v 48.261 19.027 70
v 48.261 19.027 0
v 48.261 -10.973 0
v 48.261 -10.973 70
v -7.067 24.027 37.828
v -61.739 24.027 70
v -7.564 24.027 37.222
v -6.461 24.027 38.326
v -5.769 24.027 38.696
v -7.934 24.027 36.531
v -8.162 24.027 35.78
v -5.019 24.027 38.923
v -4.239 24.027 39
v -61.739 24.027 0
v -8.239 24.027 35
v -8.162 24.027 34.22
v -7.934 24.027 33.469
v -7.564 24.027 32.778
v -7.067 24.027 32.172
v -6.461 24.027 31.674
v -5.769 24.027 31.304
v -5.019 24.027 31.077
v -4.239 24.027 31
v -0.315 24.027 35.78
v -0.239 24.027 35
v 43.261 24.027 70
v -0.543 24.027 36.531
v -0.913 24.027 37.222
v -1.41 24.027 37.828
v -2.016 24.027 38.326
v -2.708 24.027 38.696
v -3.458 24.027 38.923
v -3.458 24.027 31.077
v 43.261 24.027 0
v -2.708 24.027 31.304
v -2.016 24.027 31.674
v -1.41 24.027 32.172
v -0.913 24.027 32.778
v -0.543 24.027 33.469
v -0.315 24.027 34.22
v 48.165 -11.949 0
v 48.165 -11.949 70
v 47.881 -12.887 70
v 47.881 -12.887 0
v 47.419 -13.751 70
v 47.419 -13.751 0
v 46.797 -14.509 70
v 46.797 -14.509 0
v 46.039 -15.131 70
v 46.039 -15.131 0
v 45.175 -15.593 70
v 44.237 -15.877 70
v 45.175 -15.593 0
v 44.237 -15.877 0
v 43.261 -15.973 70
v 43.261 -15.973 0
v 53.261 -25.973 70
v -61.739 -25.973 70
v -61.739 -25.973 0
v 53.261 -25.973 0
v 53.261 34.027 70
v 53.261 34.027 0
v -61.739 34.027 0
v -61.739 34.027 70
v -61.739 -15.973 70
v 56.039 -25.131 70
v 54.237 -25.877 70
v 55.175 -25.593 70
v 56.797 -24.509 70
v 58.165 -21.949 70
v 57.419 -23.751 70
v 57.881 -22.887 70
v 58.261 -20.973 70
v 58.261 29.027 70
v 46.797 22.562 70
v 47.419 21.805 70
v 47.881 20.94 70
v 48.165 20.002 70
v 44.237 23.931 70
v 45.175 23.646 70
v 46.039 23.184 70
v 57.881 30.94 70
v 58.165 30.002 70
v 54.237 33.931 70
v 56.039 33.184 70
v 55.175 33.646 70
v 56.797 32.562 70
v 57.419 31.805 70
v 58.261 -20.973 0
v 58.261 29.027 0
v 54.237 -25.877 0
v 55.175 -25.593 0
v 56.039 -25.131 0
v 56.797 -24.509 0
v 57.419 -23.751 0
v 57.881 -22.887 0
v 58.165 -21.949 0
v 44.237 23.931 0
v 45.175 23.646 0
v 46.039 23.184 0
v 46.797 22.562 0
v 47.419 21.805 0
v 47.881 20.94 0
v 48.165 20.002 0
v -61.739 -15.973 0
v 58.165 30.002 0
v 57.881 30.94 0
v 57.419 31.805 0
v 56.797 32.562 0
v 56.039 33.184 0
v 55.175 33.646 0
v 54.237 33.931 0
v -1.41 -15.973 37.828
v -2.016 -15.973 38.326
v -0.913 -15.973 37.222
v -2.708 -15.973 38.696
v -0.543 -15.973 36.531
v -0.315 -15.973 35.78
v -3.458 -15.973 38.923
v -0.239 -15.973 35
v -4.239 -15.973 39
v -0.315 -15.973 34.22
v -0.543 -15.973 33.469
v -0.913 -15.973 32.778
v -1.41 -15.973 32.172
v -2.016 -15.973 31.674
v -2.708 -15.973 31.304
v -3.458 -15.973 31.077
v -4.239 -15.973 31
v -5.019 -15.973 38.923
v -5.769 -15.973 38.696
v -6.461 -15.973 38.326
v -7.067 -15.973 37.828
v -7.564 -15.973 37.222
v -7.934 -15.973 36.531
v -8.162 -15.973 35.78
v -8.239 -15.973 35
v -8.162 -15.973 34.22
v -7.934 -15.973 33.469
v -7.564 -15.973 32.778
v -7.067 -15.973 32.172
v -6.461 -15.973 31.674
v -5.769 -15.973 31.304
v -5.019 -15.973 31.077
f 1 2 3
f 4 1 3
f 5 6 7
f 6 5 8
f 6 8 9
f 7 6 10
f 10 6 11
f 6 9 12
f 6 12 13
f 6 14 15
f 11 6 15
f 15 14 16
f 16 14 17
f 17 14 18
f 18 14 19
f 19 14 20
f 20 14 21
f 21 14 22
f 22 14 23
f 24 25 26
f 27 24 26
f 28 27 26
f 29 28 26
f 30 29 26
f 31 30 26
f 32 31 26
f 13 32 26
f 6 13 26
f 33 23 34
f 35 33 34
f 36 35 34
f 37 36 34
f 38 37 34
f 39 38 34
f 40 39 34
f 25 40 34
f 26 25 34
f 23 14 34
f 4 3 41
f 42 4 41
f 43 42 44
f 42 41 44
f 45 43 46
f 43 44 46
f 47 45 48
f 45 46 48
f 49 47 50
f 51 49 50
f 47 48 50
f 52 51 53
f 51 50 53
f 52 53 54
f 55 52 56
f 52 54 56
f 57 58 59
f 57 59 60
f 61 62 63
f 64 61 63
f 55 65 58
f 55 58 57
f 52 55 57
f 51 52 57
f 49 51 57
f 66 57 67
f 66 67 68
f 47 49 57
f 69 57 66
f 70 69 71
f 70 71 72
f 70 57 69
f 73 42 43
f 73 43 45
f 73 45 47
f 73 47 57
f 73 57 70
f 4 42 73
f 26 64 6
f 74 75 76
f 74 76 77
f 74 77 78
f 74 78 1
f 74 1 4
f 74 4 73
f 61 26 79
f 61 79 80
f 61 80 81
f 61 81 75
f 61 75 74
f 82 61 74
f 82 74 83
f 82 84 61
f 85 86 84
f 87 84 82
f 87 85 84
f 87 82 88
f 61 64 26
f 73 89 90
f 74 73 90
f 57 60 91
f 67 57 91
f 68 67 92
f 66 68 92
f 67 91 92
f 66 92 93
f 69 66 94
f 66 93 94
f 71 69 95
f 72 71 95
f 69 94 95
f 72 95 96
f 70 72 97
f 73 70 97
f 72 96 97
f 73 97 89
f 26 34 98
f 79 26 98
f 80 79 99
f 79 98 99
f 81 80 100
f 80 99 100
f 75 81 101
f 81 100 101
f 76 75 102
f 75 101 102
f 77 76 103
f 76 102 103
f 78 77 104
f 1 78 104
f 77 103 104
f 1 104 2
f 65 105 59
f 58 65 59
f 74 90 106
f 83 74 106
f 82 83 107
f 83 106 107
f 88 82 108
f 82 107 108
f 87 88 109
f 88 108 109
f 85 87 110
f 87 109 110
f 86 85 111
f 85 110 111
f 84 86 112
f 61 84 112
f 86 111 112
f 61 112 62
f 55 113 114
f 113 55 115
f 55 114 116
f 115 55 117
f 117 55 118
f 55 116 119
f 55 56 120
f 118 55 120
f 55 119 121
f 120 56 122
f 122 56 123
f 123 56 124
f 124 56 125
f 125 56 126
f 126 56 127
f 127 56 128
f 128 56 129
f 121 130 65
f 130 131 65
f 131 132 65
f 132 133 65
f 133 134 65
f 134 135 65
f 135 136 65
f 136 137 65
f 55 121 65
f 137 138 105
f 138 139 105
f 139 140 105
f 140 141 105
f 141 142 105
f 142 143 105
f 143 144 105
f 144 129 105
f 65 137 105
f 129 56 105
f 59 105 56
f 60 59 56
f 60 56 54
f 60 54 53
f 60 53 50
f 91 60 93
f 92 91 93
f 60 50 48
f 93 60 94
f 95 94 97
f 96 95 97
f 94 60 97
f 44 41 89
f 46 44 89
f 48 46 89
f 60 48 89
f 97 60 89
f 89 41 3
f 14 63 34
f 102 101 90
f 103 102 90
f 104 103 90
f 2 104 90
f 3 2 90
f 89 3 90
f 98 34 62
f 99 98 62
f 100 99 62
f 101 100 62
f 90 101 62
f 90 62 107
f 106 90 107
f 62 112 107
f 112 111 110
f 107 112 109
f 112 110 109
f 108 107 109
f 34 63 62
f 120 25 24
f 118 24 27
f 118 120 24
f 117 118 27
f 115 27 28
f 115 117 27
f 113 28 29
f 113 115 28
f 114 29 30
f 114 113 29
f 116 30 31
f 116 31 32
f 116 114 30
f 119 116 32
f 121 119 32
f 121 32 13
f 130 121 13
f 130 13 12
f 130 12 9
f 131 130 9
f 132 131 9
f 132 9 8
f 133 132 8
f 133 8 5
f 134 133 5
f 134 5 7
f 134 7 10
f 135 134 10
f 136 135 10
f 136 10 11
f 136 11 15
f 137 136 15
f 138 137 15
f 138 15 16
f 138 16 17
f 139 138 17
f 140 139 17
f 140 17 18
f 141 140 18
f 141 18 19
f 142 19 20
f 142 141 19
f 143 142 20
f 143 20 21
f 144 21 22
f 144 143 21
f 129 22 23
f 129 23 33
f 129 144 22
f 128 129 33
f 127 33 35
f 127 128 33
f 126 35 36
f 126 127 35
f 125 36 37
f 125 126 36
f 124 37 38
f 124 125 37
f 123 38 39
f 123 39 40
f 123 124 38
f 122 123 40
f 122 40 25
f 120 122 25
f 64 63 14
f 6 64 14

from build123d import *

# Parameters (mm, degrees)
F1_DEPTH = 70
F2_R     = 4
F3_DEPTH = 50


with BuildPart() as f1:
    # F0 (on Top) → F1 (new body)
    with BuildSketch(Plane.XY):
        with BuildLine():
            Line((53.26148, 34.026845), (-61.73852, 34.026845))
            Line((-61.73852, 34.026845), (-61.73852, 24.026845))
            Line((-61.73852, 24.026845), (43.26148, 24.026845))
            ThreePointArc((43.26148, 24.026845), (46.797014, 22.562379), (48.26148, 19.026845))
            Line((48.26148, 19.026845), (48.26148, -10.973155))
            ThreePointArc((48.26148, -10.973155), (46.797014, -14.508688), (43.26148, -15.973155))
            Line((43.26148, -15.973155), (-61.73852, -15.973155))
            Line((-61.73852, -15.973155), (-61.73852, -25.973155))
            Line((-61.73852, -25.973155), (53.26148, -25.973155))
            ThreePointArc((53.26148, -25.973155), (56.797014, -24.508688), (58.26148, -20.973155))
            Line((58.26148, -20.973155), (58.26148, 29.026845))
            ThreePointArc((58.26148, 29.026845), (56.797014, 32.562379), (53.26148, 34.026845))
        make_face()
    extrude(amount=F1_DEPTH)

    # F2 (on face) → F3 (join, through all)
    with BuildSketch(Plane.XZ.offset(25.973155)):
        with Locations((-4.23852, 35)):
            Circle(F2_R)
    extrude(amount=-F3_DEPTH)


solid = f1.part
